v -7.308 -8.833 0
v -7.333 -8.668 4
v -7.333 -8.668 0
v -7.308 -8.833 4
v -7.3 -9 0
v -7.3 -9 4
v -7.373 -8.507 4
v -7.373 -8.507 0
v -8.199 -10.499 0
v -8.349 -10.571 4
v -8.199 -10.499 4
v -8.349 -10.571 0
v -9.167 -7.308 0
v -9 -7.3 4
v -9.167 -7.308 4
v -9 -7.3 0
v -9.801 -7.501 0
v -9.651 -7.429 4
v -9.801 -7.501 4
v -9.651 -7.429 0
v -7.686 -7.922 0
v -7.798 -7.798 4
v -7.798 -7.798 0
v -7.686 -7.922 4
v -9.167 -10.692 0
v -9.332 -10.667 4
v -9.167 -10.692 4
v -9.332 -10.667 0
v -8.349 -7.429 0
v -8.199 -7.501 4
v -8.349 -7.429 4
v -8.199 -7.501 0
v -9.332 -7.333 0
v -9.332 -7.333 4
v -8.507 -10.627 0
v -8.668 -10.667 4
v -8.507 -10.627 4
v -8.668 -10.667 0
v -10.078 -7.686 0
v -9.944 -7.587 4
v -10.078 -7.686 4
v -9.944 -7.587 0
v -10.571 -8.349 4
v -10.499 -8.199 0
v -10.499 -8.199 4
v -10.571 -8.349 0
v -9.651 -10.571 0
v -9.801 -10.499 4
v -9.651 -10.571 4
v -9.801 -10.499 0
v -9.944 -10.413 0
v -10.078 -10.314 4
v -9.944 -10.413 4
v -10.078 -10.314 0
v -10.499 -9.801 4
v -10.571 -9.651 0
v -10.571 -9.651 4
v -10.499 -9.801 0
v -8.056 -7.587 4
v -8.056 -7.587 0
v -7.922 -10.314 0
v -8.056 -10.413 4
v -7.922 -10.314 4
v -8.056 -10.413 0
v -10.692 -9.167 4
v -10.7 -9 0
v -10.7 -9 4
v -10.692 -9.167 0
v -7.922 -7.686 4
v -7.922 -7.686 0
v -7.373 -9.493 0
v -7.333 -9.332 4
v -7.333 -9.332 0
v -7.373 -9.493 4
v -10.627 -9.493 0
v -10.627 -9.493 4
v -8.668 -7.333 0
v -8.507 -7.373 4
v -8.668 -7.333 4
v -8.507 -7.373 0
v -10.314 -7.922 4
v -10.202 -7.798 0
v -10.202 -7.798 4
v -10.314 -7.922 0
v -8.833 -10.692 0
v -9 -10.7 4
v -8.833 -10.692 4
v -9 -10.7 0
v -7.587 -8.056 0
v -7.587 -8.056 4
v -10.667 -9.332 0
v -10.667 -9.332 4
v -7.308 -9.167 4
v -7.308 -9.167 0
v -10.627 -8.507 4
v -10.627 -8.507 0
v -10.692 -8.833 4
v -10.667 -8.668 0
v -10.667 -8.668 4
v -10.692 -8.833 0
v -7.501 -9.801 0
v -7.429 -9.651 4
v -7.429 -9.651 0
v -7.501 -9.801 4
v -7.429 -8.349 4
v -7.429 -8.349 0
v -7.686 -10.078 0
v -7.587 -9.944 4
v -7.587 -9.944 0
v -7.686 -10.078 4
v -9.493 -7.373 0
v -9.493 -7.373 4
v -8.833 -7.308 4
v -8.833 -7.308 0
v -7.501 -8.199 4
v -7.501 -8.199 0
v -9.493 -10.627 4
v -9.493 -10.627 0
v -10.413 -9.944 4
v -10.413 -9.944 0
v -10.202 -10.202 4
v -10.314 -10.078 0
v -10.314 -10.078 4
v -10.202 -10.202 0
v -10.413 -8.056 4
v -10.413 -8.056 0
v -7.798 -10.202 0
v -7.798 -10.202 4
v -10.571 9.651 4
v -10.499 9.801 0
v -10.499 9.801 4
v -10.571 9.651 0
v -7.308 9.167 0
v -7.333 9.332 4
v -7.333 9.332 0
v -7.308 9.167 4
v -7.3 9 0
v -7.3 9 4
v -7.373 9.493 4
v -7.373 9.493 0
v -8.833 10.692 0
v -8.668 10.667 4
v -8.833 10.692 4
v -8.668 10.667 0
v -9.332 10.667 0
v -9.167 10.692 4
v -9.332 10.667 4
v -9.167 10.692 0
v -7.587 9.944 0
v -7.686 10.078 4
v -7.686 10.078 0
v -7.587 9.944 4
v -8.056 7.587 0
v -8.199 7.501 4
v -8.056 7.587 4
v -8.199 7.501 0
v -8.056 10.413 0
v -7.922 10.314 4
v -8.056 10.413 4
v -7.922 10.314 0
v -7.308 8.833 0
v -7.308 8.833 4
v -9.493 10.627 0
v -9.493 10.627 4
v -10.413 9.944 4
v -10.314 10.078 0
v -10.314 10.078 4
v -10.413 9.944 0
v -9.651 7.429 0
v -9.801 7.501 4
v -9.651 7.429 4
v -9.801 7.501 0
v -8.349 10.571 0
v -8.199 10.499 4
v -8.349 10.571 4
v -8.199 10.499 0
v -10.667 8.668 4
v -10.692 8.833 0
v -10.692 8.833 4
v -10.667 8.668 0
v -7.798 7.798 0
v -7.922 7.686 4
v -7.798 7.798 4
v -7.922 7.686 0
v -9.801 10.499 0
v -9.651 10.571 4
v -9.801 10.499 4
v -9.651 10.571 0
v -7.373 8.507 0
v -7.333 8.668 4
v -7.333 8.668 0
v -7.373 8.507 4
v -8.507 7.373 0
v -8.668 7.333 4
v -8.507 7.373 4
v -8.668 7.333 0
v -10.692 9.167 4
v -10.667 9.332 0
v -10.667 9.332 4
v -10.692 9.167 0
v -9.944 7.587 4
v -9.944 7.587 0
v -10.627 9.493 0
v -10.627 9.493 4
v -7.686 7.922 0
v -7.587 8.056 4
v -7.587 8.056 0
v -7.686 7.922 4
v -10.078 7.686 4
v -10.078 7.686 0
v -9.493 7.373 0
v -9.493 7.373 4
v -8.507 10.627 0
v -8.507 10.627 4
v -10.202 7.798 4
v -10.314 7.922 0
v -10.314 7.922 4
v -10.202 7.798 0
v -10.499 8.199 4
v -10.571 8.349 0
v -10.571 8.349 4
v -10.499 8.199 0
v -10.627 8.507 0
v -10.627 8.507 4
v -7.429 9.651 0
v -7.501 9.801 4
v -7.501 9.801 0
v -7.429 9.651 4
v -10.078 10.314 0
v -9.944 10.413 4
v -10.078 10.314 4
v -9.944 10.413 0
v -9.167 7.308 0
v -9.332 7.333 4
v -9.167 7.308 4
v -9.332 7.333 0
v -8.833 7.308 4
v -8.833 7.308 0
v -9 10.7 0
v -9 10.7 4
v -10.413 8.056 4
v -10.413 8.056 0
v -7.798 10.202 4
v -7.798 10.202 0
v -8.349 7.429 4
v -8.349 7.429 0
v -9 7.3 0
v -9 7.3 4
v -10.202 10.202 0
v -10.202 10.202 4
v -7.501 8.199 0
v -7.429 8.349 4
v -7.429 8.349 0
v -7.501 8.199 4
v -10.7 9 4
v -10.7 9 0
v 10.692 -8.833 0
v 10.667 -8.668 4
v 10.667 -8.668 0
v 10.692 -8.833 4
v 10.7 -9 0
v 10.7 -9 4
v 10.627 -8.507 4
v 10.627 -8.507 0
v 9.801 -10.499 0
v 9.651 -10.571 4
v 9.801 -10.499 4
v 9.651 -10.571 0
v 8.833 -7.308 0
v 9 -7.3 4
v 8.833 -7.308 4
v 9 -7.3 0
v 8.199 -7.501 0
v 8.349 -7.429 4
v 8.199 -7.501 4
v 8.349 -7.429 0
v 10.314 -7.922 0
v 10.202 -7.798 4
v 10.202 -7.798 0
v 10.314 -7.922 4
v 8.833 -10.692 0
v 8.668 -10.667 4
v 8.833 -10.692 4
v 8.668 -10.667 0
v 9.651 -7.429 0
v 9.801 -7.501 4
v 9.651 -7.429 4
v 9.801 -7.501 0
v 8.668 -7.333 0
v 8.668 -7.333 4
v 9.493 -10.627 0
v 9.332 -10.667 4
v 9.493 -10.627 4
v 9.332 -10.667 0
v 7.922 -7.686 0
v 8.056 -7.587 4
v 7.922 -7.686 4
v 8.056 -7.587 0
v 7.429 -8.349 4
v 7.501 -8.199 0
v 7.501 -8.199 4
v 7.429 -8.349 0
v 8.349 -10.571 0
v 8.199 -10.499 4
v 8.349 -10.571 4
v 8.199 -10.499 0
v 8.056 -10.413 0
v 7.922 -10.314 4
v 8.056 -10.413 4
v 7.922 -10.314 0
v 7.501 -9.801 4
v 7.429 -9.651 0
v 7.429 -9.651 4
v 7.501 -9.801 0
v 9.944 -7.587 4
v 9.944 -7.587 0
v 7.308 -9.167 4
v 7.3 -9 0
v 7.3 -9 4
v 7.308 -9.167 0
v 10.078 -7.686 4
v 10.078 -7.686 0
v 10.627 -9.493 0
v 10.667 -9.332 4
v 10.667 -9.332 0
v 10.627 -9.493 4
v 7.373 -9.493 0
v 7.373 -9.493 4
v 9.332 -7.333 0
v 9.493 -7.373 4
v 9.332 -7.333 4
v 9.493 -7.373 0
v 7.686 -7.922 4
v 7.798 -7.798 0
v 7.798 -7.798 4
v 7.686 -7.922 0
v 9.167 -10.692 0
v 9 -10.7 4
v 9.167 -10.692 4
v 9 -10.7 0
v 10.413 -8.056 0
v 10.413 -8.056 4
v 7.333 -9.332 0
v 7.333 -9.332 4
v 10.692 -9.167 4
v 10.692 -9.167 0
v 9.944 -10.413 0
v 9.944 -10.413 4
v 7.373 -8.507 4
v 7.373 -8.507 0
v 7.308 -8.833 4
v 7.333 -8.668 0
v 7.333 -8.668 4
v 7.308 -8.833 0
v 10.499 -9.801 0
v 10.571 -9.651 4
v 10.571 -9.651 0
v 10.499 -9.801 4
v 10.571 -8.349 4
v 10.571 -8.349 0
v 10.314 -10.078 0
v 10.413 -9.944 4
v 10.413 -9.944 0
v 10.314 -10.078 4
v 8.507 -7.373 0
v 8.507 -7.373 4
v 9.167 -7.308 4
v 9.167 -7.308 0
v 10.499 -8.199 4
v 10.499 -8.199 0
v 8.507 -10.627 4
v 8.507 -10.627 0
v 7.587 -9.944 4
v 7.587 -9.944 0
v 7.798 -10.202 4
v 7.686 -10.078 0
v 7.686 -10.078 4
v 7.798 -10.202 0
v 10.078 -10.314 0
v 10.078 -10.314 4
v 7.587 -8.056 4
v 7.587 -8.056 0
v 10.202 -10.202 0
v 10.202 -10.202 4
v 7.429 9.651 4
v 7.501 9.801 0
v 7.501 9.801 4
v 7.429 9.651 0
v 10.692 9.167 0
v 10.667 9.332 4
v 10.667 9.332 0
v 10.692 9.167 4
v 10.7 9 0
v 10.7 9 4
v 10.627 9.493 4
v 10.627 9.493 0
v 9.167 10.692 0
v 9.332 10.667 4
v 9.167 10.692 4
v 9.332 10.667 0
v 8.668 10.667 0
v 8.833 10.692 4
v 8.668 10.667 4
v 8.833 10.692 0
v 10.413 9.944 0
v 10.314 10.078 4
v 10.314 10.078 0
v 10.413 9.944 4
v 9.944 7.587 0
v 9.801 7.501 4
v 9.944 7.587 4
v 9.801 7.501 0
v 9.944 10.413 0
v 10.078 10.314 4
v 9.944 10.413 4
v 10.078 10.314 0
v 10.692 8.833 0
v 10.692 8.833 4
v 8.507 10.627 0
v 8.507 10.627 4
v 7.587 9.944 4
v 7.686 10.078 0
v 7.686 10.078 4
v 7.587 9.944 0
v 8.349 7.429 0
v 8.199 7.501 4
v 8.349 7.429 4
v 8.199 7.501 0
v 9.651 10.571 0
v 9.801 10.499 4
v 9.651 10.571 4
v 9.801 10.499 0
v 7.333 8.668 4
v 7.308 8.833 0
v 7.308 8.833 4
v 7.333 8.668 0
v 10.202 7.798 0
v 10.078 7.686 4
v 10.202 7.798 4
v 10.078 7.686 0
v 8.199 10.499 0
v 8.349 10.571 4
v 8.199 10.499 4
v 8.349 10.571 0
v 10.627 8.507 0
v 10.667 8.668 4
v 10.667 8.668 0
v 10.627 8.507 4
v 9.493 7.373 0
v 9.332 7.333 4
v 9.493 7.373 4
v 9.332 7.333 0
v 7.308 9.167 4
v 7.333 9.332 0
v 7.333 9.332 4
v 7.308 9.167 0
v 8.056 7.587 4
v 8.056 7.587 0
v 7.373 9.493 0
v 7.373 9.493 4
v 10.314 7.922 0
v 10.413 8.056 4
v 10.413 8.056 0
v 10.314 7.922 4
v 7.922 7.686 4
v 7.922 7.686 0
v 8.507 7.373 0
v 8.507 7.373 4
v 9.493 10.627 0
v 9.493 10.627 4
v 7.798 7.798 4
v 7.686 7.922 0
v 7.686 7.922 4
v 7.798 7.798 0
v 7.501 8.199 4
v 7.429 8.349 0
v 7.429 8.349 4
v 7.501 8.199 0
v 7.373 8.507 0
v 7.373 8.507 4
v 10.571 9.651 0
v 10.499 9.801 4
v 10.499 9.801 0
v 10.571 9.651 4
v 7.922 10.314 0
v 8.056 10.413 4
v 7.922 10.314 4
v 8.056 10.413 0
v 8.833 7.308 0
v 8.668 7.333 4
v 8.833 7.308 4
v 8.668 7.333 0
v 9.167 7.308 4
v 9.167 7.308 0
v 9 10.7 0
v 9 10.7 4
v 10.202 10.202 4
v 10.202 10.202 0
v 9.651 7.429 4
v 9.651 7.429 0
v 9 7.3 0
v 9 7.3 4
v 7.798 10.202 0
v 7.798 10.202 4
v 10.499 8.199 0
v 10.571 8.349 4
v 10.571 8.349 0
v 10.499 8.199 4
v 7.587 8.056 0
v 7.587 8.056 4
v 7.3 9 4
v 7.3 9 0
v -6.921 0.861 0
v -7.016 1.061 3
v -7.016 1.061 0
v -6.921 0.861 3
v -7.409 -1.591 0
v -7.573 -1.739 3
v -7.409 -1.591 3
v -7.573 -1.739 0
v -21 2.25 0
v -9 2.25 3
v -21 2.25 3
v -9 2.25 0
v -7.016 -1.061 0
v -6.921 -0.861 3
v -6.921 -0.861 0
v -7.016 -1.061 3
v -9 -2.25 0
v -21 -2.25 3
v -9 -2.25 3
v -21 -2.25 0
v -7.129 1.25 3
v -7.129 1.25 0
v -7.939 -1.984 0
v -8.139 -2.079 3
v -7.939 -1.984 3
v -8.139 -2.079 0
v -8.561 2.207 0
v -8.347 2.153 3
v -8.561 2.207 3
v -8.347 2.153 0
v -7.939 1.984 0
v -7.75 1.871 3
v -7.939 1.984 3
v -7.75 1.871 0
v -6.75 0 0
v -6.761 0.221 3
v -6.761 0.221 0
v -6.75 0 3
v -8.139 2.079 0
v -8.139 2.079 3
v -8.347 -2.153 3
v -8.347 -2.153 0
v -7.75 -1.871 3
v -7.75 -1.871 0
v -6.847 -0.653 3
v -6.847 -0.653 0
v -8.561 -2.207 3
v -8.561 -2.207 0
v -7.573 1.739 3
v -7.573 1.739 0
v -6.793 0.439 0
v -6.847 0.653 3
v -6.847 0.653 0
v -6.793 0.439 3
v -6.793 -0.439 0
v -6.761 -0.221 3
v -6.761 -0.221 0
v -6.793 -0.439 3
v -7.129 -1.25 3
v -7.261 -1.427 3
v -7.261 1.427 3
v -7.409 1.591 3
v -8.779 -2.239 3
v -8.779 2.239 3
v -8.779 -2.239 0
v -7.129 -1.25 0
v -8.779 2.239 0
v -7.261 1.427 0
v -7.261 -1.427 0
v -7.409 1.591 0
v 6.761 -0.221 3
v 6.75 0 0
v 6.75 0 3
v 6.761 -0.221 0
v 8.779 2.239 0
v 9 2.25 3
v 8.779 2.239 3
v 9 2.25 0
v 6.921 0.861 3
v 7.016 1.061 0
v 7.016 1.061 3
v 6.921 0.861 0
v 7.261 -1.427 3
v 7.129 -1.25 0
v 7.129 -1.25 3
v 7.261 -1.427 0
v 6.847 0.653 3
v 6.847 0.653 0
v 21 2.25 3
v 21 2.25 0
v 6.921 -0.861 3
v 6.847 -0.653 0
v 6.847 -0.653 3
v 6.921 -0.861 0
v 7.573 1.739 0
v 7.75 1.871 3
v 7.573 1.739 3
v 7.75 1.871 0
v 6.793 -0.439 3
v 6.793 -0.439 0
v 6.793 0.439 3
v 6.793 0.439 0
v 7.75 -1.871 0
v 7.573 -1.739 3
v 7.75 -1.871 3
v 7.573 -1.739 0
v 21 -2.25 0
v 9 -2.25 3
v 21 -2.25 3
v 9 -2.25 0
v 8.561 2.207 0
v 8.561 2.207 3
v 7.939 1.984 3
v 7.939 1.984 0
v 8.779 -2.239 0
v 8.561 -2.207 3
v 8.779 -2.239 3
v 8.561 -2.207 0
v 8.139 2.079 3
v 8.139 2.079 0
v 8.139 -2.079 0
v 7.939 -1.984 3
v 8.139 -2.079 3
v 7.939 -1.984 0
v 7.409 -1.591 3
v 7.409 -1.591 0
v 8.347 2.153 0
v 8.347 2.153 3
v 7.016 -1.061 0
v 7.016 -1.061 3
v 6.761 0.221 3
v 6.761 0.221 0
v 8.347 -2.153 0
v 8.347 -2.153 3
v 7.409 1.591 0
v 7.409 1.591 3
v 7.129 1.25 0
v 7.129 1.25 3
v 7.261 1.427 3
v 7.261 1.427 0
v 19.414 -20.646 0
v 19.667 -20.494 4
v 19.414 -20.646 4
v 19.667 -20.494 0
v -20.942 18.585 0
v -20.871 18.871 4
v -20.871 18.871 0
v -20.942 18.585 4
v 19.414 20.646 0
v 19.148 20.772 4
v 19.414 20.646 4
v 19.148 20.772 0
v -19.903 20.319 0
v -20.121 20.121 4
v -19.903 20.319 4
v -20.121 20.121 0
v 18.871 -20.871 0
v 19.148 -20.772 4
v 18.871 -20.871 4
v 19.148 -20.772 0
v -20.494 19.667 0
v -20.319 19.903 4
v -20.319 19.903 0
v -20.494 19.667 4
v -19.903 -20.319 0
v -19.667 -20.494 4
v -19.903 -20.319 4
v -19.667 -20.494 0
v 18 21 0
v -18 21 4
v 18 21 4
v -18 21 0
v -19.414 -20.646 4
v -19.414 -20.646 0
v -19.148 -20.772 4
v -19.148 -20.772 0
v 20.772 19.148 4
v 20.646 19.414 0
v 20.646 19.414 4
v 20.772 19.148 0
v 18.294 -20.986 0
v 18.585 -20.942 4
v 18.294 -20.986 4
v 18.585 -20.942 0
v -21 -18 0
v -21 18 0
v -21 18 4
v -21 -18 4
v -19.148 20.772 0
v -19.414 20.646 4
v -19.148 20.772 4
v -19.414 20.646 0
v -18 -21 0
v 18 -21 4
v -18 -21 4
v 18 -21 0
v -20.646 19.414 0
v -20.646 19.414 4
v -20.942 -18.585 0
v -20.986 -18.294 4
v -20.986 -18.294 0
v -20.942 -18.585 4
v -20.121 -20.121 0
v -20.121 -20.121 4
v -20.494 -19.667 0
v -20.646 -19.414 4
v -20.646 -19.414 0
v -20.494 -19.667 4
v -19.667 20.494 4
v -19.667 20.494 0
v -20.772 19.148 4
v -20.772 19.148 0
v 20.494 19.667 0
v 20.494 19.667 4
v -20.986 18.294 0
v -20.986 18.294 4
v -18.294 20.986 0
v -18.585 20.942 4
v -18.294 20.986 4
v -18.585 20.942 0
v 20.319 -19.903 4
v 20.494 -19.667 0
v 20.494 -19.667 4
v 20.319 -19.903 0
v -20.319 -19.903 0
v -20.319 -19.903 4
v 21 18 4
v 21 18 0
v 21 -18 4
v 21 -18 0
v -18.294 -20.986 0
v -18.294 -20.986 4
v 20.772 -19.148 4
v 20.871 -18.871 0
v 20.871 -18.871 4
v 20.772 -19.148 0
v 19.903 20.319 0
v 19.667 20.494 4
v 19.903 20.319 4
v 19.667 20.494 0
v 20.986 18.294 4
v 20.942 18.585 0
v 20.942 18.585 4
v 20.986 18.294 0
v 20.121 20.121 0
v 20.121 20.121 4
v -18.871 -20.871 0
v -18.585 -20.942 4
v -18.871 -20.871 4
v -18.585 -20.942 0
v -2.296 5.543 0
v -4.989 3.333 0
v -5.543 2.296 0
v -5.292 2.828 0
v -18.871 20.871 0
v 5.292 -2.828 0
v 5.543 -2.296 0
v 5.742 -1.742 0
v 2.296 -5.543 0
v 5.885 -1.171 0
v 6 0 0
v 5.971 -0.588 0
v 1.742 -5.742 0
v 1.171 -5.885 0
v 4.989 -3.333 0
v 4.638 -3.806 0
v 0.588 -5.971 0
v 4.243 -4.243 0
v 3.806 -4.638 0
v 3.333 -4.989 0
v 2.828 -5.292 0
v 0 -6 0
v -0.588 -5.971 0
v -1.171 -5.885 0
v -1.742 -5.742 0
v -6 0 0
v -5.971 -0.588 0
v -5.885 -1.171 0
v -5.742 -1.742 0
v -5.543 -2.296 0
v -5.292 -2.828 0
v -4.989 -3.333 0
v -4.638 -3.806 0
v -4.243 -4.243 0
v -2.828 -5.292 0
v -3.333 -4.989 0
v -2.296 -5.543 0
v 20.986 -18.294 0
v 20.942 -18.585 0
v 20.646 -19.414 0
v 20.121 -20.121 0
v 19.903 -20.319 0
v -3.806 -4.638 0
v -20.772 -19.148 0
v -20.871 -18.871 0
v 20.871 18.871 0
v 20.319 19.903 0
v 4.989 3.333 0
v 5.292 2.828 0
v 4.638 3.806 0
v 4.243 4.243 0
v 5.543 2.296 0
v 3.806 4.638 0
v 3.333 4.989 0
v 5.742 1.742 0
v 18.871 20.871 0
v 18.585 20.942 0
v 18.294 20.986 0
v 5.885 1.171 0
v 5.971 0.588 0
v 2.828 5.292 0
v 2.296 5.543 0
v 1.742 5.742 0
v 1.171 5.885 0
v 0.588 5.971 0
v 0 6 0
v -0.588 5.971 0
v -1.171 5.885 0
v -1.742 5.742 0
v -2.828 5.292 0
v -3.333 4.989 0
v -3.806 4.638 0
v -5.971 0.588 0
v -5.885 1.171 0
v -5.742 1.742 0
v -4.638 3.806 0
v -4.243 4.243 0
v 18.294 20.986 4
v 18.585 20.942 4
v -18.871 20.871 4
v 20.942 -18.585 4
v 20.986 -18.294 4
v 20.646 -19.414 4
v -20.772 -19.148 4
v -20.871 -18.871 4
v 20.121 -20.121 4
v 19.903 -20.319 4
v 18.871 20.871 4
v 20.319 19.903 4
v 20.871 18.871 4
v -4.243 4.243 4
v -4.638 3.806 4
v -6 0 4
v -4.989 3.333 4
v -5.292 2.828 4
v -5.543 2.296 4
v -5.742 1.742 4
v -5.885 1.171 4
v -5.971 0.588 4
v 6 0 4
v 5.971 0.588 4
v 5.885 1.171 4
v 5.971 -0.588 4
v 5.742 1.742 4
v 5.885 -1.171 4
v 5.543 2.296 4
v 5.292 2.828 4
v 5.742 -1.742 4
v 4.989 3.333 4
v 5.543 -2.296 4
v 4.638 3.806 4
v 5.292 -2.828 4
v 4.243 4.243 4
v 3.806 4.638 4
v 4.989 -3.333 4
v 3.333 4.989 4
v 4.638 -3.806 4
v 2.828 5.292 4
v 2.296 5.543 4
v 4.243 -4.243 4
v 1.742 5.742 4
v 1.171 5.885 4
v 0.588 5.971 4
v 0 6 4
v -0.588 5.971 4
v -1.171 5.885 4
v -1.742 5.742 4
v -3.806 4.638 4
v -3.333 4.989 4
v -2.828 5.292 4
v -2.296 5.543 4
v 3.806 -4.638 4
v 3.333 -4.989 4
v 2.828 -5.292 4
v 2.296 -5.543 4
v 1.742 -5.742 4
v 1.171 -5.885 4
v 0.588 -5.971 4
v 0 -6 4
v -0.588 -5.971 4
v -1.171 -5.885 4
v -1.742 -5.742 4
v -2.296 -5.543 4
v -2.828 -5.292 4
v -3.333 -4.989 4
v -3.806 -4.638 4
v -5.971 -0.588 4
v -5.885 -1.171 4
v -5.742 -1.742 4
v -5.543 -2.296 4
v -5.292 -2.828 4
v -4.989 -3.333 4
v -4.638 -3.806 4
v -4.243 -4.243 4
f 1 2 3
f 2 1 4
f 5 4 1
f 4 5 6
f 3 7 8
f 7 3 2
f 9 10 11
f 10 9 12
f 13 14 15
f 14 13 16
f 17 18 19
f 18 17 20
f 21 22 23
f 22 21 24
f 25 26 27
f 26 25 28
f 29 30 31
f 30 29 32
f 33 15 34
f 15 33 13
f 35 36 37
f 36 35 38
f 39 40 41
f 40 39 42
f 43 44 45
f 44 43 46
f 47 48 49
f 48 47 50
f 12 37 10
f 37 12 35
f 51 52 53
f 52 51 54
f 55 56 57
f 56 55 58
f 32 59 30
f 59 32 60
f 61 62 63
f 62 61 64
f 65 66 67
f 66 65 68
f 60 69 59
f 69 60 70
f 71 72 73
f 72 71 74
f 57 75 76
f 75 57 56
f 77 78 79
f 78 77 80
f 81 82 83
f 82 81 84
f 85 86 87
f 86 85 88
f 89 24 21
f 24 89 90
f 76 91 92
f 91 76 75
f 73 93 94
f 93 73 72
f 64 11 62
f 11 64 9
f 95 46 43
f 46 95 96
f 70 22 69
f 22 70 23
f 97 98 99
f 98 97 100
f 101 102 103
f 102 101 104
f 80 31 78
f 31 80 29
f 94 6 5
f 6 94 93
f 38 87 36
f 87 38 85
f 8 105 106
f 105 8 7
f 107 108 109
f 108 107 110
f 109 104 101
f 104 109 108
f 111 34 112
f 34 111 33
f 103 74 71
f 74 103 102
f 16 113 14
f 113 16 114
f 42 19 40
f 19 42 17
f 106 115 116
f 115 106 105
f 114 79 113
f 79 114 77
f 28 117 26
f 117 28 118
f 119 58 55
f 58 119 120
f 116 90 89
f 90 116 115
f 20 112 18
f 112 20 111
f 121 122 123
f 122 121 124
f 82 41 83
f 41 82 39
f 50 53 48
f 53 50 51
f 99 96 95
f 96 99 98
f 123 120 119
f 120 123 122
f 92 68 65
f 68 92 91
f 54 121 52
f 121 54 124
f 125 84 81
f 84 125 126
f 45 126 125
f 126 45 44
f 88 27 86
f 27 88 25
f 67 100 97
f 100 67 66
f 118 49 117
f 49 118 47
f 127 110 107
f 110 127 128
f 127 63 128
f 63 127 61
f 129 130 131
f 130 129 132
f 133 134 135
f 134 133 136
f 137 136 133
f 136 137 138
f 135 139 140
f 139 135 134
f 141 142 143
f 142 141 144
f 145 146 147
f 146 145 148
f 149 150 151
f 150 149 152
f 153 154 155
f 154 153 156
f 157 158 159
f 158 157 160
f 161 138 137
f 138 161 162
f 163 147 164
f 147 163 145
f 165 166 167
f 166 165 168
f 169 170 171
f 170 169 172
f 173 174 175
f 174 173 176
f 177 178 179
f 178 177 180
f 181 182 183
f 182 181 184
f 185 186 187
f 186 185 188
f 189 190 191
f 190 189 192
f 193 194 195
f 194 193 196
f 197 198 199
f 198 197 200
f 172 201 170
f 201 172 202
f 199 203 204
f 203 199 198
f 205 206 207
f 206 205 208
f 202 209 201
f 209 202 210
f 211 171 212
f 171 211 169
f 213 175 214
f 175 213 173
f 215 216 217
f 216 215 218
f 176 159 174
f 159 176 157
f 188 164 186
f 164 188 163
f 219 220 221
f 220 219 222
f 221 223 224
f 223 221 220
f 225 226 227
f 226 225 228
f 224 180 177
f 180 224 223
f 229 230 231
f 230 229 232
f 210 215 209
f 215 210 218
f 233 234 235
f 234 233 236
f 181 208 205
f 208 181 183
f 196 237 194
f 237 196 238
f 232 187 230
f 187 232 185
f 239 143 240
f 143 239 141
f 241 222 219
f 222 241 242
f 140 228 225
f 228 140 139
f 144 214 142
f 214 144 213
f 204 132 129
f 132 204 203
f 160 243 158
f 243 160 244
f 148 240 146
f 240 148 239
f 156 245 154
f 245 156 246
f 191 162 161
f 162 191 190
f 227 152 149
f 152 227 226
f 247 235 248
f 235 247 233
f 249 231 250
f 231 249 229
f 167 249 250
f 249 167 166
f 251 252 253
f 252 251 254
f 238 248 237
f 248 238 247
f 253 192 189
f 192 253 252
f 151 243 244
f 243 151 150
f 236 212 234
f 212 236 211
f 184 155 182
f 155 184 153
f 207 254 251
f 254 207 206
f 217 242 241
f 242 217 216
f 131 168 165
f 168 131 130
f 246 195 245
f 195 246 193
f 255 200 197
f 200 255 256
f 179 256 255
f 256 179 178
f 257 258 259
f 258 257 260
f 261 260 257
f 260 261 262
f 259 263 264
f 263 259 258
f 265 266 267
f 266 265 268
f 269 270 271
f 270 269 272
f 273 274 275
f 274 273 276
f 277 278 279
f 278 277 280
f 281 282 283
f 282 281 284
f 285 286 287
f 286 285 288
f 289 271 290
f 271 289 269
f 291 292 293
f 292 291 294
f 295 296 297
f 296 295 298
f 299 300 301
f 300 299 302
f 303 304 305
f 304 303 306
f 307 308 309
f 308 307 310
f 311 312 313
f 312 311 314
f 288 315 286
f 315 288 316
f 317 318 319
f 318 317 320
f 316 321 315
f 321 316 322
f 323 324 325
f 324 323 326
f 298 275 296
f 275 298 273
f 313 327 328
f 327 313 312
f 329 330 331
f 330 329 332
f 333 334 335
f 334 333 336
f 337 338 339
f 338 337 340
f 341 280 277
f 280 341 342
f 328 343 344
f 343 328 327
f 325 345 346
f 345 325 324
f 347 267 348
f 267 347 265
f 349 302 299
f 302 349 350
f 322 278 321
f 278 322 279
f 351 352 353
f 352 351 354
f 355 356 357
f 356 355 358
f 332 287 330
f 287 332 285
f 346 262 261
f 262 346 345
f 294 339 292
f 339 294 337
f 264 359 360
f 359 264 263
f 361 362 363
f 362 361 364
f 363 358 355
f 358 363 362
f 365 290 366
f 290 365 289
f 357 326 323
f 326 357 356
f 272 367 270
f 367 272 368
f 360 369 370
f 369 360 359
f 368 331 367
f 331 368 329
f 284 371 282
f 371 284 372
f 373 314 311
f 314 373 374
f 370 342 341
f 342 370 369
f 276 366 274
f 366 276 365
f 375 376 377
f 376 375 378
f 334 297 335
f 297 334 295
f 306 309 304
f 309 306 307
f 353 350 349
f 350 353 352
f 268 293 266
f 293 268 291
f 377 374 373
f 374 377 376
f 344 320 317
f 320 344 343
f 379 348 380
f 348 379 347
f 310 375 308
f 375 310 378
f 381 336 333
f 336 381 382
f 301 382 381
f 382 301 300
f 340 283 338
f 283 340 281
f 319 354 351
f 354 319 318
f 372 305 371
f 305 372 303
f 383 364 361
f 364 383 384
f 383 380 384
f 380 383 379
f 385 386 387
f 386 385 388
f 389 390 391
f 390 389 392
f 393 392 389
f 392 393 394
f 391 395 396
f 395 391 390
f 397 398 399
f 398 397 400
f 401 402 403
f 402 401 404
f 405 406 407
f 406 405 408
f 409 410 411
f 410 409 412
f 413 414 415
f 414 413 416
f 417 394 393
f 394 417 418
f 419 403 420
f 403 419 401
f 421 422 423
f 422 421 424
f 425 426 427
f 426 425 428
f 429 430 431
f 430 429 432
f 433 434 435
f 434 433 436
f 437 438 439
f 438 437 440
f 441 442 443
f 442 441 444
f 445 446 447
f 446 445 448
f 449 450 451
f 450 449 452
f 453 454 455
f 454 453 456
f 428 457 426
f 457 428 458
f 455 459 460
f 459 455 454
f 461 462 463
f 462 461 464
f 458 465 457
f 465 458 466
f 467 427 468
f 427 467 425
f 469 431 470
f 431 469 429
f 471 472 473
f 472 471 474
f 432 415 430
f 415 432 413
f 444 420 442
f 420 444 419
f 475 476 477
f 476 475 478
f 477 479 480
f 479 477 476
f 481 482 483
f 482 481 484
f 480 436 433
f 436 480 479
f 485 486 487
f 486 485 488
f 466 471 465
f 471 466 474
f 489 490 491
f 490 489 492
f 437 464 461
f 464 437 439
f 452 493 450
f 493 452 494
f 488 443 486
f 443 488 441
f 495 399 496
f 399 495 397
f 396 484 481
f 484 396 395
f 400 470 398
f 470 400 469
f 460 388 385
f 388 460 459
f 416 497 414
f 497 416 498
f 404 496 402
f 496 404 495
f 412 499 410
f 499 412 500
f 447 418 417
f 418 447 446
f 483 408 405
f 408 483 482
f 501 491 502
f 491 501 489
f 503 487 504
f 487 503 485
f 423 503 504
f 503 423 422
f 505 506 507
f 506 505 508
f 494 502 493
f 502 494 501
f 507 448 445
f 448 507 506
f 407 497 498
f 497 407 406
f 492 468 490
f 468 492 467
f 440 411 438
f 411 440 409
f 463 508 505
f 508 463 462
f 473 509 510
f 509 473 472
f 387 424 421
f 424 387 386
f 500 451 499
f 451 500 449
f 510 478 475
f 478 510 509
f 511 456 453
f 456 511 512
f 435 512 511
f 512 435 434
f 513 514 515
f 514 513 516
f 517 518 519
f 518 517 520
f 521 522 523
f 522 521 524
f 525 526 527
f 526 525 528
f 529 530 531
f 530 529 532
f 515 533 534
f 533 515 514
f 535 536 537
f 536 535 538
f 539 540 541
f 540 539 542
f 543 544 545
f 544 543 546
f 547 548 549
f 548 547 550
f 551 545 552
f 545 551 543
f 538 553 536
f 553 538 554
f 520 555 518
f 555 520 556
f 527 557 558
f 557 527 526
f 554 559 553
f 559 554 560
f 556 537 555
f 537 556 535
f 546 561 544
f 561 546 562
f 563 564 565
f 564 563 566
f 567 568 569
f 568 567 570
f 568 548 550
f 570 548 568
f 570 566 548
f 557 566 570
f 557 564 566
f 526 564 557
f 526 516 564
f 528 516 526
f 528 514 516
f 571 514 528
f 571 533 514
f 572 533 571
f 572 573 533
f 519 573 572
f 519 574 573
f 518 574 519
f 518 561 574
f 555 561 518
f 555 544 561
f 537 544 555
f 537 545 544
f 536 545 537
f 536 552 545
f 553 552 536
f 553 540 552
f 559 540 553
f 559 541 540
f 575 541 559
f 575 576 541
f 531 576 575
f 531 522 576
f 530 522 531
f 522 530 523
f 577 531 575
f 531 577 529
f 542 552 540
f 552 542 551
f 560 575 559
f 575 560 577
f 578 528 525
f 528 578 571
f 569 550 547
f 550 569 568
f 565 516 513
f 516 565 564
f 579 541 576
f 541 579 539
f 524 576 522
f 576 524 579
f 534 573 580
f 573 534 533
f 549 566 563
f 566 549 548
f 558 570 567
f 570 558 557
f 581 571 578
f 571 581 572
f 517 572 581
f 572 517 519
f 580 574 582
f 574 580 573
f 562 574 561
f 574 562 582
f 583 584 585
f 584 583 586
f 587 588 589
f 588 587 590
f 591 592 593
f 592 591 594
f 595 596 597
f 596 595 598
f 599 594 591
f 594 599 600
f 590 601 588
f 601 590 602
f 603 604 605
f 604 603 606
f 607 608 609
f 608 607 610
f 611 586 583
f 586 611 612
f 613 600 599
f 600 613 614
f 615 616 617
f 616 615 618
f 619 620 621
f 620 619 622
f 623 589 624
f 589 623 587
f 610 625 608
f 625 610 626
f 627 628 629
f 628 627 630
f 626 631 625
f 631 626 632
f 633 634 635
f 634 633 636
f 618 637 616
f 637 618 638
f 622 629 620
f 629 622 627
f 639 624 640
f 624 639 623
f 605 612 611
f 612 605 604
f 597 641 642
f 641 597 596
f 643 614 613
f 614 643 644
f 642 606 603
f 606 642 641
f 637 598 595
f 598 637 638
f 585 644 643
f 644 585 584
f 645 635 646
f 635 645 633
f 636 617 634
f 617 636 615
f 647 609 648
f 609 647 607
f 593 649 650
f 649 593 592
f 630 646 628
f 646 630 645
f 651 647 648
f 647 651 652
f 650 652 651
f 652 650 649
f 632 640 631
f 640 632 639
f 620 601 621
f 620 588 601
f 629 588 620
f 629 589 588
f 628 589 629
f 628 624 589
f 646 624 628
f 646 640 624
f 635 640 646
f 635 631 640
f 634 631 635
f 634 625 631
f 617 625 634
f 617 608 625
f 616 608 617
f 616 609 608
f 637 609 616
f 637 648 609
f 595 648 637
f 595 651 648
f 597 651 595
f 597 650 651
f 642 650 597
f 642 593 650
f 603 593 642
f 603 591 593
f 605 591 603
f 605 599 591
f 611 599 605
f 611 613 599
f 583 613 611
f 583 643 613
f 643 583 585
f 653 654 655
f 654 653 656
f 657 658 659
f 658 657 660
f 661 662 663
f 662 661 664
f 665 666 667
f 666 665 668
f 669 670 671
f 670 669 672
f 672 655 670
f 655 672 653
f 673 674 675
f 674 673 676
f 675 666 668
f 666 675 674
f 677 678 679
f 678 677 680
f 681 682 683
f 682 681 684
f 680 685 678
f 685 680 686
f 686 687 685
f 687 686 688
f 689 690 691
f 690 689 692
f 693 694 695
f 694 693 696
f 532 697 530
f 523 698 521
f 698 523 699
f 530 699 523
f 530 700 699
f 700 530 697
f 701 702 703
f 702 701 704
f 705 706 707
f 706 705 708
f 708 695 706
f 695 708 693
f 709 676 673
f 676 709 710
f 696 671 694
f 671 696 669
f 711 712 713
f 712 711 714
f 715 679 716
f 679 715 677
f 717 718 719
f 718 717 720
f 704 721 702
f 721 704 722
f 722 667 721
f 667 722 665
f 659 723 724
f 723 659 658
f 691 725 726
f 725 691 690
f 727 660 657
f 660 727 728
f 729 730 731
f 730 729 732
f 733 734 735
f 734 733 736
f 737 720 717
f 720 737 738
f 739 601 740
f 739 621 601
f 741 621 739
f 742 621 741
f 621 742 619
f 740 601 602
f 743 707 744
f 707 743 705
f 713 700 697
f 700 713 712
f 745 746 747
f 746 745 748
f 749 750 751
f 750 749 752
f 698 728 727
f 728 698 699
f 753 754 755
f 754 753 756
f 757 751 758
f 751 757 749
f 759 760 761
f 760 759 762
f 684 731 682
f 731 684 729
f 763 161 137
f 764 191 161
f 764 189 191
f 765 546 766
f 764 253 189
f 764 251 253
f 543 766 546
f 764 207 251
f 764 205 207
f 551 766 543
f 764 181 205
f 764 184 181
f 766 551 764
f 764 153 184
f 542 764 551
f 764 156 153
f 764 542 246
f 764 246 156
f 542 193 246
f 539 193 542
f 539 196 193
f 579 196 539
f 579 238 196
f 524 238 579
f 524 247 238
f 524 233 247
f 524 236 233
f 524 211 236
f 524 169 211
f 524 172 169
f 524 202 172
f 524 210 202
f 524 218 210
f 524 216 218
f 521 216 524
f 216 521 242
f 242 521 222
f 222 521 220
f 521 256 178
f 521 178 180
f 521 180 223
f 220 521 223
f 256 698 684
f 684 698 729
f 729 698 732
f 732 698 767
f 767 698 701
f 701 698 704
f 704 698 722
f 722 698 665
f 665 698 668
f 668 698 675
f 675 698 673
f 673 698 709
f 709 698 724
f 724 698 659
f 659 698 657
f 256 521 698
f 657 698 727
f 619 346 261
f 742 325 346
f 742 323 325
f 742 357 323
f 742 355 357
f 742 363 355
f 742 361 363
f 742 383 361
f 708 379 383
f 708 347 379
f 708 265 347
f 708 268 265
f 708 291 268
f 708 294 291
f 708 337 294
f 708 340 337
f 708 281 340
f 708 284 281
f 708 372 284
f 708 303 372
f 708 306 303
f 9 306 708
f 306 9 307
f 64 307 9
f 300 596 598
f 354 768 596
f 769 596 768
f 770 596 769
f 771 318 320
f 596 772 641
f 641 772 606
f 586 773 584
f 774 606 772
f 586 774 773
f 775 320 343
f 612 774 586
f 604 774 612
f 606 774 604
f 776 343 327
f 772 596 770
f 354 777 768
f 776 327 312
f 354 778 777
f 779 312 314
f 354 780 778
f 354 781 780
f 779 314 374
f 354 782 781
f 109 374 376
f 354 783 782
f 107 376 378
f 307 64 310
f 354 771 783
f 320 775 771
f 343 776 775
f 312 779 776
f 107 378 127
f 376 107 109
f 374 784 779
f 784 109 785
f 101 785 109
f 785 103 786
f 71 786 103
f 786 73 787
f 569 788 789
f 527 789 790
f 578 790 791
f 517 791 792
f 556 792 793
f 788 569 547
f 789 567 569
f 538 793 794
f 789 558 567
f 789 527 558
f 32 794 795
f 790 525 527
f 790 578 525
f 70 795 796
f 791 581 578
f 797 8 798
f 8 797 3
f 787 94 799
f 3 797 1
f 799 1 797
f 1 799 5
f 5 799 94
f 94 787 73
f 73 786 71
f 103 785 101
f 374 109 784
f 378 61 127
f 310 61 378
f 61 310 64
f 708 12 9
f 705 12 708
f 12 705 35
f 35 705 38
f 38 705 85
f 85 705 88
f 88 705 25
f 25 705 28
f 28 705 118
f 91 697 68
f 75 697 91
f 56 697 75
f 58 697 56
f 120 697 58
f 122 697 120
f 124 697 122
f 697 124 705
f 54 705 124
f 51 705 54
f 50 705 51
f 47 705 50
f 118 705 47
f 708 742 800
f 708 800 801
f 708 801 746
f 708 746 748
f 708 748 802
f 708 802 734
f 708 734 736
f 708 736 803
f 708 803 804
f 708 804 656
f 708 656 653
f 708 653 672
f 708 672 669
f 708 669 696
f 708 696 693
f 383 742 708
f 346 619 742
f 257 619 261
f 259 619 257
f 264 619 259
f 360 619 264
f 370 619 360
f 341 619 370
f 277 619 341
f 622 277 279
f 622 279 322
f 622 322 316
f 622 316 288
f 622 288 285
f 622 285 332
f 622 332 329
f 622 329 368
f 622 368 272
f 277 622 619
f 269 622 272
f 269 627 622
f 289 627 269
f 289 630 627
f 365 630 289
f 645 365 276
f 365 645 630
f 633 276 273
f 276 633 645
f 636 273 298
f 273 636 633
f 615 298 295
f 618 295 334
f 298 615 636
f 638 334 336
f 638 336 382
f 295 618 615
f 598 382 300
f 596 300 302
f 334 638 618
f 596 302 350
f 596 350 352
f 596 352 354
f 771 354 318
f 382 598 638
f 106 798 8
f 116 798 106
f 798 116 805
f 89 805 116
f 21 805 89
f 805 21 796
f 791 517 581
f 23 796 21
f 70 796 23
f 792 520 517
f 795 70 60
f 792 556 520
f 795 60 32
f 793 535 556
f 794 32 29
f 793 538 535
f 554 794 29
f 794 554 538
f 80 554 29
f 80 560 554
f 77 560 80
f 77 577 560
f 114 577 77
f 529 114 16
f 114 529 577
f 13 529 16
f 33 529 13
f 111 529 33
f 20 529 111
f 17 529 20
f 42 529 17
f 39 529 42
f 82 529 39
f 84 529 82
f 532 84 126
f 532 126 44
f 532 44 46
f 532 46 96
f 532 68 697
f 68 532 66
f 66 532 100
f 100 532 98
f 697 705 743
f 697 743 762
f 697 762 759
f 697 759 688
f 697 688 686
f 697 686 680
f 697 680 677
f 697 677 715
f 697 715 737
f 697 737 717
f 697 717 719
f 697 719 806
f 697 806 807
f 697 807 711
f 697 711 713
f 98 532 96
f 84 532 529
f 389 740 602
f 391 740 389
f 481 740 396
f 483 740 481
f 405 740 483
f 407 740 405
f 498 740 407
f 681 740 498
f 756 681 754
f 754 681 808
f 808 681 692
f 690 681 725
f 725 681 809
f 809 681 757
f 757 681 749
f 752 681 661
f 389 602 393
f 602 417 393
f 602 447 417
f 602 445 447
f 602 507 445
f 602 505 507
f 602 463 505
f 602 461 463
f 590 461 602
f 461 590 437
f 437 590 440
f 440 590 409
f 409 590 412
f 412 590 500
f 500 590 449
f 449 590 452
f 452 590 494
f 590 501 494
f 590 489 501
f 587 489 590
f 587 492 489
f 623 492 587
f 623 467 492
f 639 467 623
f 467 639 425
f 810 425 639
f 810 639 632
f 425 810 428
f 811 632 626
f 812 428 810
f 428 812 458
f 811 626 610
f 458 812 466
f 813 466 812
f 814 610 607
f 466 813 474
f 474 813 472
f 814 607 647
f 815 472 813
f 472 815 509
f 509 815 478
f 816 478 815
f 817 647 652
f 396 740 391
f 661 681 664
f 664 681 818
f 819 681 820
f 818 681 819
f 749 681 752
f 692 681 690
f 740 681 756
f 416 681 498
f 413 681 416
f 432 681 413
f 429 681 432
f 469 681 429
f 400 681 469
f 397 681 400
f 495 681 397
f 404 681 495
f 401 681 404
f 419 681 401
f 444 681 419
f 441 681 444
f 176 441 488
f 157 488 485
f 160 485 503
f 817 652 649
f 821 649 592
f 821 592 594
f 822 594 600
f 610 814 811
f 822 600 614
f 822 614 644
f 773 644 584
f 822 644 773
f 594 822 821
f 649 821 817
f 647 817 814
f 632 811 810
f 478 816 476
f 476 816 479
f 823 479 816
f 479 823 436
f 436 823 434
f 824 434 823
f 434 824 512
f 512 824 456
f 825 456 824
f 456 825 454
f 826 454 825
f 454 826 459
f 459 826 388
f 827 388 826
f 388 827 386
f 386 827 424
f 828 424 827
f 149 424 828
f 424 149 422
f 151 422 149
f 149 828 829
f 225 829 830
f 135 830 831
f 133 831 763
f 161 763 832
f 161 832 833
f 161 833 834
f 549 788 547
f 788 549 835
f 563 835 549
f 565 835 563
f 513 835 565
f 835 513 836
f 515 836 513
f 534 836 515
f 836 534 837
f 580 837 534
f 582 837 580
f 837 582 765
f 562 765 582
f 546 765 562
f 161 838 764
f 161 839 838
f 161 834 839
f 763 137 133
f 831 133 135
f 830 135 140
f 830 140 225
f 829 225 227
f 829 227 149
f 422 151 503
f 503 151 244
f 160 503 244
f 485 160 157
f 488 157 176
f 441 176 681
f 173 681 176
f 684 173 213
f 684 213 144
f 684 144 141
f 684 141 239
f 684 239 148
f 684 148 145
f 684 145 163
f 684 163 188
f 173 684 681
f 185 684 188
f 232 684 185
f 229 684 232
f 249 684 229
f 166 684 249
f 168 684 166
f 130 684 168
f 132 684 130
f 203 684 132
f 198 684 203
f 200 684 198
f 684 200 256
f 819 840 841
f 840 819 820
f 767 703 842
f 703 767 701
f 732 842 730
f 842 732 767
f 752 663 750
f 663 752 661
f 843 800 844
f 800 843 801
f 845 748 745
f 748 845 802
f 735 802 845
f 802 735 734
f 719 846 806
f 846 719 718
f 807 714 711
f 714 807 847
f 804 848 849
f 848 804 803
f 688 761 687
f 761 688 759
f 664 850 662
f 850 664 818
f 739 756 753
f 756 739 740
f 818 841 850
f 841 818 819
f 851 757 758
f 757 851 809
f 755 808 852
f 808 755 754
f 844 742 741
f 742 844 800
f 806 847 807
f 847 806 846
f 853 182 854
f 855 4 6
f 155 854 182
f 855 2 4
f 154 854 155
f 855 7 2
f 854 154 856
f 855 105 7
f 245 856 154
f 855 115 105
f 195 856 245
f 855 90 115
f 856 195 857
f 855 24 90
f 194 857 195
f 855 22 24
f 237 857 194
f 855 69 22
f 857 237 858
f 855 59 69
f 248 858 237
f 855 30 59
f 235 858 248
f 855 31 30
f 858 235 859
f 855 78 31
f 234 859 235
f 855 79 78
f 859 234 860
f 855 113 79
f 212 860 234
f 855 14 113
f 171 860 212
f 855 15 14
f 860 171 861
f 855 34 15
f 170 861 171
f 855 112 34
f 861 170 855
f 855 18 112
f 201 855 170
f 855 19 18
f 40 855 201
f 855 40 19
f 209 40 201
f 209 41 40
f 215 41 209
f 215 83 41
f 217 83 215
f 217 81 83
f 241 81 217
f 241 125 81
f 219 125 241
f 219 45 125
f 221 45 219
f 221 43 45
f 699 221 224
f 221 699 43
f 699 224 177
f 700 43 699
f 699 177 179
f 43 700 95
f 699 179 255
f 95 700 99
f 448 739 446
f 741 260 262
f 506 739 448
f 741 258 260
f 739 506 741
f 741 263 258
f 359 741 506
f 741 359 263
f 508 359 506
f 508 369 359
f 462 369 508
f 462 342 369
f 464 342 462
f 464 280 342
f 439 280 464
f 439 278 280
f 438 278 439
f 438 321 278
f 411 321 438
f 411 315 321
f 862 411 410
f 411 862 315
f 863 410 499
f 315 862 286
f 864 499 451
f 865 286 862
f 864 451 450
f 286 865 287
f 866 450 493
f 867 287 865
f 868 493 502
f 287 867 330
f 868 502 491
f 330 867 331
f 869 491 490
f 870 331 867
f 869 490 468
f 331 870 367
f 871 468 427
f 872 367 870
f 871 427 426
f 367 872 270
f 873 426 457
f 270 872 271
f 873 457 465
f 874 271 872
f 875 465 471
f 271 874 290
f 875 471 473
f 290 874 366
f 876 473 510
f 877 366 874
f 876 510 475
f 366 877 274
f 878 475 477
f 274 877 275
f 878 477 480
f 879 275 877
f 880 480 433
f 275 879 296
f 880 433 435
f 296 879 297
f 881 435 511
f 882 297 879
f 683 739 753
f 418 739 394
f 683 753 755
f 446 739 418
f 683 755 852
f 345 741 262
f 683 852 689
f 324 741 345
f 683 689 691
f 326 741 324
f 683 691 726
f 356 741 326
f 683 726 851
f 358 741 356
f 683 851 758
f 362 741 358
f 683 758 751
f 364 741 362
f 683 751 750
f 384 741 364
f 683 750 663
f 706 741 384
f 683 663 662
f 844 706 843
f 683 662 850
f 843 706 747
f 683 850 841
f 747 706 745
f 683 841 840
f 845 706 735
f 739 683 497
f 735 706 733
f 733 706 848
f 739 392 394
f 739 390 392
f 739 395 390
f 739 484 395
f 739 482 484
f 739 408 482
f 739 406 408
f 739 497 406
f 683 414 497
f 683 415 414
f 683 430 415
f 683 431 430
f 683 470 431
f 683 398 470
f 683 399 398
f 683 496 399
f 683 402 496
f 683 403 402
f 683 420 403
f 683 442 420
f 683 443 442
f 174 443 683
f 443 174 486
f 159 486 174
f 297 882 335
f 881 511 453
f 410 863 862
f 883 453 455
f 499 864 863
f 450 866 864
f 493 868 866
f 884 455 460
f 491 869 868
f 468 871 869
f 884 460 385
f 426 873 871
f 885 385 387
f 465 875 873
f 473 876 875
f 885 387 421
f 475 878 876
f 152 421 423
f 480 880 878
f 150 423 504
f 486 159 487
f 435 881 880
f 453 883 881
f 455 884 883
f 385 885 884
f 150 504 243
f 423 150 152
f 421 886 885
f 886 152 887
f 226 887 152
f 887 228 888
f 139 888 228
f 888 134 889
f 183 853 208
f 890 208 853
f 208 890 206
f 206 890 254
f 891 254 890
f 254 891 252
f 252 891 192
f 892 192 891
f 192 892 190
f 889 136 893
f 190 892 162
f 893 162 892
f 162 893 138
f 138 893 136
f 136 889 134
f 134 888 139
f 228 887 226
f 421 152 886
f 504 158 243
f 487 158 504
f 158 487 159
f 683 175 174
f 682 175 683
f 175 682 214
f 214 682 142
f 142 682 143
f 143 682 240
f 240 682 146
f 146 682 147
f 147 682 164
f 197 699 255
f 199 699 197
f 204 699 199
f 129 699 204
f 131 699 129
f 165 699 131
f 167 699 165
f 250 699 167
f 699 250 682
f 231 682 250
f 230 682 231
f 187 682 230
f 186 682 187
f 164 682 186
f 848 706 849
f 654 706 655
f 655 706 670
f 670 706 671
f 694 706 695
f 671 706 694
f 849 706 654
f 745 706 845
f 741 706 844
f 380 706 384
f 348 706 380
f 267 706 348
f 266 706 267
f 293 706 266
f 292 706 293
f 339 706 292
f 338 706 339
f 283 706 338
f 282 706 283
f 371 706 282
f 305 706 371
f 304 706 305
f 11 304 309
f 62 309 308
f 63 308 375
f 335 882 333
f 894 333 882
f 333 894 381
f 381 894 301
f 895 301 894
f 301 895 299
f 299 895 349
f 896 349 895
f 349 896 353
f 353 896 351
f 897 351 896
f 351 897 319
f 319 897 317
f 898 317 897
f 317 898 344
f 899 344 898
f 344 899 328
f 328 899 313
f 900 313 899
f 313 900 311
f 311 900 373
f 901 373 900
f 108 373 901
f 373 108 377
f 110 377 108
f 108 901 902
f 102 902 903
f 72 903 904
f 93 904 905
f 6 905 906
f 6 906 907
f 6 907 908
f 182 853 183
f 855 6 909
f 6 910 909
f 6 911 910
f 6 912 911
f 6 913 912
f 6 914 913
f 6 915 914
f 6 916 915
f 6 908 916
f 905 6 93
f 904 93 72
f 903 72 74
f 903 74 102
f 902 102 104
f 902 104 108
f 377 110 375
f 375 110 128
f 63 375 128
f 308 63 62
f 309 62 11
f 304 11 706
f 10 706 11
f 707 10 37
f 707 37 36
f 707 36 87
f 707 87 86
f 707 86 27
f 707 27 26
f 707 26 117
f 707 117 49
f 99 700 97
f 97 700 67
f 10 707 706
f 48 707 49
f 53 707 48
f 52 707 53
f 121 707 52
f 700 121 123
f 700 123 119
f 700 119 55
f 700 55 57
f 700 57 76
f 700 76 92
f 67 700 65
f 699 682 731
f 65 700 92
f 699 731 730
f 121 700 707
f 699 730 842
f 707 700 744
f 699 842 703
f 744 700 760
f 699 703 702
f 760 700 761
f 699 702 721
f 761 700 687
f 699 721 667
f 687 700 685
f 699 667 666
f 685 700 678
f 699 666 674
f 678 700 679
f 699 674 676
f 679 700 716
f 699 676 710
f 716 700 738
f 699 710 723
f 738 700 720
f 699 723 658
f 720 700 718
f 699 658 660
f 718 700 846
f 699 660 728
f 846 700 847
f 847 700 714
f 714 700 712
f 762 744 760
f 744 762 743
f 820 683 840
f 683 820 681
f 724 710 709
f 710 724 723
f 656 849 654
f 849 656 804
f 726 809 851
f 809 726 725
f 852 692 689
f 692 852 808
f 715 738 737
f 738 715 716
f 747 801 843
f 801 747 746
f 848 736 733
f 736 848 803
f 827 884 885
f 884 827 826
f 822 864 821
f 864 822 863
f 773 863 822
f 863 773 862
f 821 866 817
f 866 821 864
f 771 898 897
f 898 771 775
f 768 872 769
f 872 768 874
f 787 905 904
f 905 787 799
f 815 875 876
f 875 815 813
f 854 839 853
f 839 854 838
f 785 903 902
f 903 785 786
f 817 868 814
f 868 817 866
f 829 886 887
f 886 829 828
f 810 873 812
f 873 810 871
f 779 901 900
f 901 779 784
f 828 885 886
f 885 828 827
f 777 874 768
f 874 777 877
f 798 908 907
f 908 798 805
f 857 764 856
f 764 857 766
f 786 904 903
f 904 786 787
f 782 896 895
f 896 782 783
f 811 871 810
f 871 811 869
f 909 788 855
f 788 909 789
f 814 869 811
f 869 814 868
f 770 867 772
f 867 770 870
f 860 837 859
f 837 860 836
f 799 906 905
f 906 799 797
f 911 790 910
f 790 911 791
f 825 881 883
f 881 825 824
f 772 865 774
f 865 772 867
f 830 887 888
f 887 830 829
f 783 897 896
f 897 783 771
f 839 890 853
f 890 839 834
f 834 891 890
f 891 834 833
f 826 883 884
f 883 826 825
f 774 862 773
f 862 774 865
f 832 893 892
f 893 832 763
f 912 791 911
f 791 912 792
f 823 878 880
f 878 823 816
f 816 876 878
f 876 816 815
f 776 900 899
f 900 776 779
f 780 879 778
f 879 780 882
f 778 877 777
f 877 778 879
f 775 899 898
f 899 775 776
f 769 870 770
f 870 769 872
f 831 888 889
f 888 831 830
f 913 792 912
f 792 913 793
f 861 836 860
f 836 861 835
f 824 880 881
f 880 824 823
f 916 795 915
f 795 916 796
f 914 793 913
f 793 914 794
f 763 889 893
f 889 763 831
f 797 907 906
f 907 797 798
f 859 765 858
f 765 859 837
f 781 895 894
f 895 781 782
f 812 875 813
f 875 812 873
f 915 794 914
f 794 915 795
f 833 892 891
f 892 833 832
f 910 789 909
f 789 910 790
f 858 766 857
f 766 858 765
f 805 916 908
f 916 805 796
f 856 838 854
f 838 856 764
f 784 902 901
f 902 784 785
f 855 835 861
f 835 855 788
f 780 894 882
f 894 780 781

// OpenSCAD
// file: ../../common.scad
$fn=64;
module rounded_box2d(x,y,r=4){ offset(r=r) offset(delta=-r) square([x,y],center=true); }
module plate(x,y,h,r=4){ linear_extrude(h) rounded_box2d(x,y,r); }
module slot3d(len,d,h){ hull(){translate([-len/2,0,0])cylinder(h=h,d=d,center=true);translate([len/2,0,0])cylinder(h=h,d=d,center=true);} }
// main file
include <../../common.scad>
difference(){plate(42,42,4,3);cylinder(h=12,d=12,center=true);for(x=[-9,9])for(y=[-9,9])translate([x,y,-1])cylinder(h=8,d=3.4);for(x=[-15,15])translate([x,0,0])slot3d(12,4.5,6);}
